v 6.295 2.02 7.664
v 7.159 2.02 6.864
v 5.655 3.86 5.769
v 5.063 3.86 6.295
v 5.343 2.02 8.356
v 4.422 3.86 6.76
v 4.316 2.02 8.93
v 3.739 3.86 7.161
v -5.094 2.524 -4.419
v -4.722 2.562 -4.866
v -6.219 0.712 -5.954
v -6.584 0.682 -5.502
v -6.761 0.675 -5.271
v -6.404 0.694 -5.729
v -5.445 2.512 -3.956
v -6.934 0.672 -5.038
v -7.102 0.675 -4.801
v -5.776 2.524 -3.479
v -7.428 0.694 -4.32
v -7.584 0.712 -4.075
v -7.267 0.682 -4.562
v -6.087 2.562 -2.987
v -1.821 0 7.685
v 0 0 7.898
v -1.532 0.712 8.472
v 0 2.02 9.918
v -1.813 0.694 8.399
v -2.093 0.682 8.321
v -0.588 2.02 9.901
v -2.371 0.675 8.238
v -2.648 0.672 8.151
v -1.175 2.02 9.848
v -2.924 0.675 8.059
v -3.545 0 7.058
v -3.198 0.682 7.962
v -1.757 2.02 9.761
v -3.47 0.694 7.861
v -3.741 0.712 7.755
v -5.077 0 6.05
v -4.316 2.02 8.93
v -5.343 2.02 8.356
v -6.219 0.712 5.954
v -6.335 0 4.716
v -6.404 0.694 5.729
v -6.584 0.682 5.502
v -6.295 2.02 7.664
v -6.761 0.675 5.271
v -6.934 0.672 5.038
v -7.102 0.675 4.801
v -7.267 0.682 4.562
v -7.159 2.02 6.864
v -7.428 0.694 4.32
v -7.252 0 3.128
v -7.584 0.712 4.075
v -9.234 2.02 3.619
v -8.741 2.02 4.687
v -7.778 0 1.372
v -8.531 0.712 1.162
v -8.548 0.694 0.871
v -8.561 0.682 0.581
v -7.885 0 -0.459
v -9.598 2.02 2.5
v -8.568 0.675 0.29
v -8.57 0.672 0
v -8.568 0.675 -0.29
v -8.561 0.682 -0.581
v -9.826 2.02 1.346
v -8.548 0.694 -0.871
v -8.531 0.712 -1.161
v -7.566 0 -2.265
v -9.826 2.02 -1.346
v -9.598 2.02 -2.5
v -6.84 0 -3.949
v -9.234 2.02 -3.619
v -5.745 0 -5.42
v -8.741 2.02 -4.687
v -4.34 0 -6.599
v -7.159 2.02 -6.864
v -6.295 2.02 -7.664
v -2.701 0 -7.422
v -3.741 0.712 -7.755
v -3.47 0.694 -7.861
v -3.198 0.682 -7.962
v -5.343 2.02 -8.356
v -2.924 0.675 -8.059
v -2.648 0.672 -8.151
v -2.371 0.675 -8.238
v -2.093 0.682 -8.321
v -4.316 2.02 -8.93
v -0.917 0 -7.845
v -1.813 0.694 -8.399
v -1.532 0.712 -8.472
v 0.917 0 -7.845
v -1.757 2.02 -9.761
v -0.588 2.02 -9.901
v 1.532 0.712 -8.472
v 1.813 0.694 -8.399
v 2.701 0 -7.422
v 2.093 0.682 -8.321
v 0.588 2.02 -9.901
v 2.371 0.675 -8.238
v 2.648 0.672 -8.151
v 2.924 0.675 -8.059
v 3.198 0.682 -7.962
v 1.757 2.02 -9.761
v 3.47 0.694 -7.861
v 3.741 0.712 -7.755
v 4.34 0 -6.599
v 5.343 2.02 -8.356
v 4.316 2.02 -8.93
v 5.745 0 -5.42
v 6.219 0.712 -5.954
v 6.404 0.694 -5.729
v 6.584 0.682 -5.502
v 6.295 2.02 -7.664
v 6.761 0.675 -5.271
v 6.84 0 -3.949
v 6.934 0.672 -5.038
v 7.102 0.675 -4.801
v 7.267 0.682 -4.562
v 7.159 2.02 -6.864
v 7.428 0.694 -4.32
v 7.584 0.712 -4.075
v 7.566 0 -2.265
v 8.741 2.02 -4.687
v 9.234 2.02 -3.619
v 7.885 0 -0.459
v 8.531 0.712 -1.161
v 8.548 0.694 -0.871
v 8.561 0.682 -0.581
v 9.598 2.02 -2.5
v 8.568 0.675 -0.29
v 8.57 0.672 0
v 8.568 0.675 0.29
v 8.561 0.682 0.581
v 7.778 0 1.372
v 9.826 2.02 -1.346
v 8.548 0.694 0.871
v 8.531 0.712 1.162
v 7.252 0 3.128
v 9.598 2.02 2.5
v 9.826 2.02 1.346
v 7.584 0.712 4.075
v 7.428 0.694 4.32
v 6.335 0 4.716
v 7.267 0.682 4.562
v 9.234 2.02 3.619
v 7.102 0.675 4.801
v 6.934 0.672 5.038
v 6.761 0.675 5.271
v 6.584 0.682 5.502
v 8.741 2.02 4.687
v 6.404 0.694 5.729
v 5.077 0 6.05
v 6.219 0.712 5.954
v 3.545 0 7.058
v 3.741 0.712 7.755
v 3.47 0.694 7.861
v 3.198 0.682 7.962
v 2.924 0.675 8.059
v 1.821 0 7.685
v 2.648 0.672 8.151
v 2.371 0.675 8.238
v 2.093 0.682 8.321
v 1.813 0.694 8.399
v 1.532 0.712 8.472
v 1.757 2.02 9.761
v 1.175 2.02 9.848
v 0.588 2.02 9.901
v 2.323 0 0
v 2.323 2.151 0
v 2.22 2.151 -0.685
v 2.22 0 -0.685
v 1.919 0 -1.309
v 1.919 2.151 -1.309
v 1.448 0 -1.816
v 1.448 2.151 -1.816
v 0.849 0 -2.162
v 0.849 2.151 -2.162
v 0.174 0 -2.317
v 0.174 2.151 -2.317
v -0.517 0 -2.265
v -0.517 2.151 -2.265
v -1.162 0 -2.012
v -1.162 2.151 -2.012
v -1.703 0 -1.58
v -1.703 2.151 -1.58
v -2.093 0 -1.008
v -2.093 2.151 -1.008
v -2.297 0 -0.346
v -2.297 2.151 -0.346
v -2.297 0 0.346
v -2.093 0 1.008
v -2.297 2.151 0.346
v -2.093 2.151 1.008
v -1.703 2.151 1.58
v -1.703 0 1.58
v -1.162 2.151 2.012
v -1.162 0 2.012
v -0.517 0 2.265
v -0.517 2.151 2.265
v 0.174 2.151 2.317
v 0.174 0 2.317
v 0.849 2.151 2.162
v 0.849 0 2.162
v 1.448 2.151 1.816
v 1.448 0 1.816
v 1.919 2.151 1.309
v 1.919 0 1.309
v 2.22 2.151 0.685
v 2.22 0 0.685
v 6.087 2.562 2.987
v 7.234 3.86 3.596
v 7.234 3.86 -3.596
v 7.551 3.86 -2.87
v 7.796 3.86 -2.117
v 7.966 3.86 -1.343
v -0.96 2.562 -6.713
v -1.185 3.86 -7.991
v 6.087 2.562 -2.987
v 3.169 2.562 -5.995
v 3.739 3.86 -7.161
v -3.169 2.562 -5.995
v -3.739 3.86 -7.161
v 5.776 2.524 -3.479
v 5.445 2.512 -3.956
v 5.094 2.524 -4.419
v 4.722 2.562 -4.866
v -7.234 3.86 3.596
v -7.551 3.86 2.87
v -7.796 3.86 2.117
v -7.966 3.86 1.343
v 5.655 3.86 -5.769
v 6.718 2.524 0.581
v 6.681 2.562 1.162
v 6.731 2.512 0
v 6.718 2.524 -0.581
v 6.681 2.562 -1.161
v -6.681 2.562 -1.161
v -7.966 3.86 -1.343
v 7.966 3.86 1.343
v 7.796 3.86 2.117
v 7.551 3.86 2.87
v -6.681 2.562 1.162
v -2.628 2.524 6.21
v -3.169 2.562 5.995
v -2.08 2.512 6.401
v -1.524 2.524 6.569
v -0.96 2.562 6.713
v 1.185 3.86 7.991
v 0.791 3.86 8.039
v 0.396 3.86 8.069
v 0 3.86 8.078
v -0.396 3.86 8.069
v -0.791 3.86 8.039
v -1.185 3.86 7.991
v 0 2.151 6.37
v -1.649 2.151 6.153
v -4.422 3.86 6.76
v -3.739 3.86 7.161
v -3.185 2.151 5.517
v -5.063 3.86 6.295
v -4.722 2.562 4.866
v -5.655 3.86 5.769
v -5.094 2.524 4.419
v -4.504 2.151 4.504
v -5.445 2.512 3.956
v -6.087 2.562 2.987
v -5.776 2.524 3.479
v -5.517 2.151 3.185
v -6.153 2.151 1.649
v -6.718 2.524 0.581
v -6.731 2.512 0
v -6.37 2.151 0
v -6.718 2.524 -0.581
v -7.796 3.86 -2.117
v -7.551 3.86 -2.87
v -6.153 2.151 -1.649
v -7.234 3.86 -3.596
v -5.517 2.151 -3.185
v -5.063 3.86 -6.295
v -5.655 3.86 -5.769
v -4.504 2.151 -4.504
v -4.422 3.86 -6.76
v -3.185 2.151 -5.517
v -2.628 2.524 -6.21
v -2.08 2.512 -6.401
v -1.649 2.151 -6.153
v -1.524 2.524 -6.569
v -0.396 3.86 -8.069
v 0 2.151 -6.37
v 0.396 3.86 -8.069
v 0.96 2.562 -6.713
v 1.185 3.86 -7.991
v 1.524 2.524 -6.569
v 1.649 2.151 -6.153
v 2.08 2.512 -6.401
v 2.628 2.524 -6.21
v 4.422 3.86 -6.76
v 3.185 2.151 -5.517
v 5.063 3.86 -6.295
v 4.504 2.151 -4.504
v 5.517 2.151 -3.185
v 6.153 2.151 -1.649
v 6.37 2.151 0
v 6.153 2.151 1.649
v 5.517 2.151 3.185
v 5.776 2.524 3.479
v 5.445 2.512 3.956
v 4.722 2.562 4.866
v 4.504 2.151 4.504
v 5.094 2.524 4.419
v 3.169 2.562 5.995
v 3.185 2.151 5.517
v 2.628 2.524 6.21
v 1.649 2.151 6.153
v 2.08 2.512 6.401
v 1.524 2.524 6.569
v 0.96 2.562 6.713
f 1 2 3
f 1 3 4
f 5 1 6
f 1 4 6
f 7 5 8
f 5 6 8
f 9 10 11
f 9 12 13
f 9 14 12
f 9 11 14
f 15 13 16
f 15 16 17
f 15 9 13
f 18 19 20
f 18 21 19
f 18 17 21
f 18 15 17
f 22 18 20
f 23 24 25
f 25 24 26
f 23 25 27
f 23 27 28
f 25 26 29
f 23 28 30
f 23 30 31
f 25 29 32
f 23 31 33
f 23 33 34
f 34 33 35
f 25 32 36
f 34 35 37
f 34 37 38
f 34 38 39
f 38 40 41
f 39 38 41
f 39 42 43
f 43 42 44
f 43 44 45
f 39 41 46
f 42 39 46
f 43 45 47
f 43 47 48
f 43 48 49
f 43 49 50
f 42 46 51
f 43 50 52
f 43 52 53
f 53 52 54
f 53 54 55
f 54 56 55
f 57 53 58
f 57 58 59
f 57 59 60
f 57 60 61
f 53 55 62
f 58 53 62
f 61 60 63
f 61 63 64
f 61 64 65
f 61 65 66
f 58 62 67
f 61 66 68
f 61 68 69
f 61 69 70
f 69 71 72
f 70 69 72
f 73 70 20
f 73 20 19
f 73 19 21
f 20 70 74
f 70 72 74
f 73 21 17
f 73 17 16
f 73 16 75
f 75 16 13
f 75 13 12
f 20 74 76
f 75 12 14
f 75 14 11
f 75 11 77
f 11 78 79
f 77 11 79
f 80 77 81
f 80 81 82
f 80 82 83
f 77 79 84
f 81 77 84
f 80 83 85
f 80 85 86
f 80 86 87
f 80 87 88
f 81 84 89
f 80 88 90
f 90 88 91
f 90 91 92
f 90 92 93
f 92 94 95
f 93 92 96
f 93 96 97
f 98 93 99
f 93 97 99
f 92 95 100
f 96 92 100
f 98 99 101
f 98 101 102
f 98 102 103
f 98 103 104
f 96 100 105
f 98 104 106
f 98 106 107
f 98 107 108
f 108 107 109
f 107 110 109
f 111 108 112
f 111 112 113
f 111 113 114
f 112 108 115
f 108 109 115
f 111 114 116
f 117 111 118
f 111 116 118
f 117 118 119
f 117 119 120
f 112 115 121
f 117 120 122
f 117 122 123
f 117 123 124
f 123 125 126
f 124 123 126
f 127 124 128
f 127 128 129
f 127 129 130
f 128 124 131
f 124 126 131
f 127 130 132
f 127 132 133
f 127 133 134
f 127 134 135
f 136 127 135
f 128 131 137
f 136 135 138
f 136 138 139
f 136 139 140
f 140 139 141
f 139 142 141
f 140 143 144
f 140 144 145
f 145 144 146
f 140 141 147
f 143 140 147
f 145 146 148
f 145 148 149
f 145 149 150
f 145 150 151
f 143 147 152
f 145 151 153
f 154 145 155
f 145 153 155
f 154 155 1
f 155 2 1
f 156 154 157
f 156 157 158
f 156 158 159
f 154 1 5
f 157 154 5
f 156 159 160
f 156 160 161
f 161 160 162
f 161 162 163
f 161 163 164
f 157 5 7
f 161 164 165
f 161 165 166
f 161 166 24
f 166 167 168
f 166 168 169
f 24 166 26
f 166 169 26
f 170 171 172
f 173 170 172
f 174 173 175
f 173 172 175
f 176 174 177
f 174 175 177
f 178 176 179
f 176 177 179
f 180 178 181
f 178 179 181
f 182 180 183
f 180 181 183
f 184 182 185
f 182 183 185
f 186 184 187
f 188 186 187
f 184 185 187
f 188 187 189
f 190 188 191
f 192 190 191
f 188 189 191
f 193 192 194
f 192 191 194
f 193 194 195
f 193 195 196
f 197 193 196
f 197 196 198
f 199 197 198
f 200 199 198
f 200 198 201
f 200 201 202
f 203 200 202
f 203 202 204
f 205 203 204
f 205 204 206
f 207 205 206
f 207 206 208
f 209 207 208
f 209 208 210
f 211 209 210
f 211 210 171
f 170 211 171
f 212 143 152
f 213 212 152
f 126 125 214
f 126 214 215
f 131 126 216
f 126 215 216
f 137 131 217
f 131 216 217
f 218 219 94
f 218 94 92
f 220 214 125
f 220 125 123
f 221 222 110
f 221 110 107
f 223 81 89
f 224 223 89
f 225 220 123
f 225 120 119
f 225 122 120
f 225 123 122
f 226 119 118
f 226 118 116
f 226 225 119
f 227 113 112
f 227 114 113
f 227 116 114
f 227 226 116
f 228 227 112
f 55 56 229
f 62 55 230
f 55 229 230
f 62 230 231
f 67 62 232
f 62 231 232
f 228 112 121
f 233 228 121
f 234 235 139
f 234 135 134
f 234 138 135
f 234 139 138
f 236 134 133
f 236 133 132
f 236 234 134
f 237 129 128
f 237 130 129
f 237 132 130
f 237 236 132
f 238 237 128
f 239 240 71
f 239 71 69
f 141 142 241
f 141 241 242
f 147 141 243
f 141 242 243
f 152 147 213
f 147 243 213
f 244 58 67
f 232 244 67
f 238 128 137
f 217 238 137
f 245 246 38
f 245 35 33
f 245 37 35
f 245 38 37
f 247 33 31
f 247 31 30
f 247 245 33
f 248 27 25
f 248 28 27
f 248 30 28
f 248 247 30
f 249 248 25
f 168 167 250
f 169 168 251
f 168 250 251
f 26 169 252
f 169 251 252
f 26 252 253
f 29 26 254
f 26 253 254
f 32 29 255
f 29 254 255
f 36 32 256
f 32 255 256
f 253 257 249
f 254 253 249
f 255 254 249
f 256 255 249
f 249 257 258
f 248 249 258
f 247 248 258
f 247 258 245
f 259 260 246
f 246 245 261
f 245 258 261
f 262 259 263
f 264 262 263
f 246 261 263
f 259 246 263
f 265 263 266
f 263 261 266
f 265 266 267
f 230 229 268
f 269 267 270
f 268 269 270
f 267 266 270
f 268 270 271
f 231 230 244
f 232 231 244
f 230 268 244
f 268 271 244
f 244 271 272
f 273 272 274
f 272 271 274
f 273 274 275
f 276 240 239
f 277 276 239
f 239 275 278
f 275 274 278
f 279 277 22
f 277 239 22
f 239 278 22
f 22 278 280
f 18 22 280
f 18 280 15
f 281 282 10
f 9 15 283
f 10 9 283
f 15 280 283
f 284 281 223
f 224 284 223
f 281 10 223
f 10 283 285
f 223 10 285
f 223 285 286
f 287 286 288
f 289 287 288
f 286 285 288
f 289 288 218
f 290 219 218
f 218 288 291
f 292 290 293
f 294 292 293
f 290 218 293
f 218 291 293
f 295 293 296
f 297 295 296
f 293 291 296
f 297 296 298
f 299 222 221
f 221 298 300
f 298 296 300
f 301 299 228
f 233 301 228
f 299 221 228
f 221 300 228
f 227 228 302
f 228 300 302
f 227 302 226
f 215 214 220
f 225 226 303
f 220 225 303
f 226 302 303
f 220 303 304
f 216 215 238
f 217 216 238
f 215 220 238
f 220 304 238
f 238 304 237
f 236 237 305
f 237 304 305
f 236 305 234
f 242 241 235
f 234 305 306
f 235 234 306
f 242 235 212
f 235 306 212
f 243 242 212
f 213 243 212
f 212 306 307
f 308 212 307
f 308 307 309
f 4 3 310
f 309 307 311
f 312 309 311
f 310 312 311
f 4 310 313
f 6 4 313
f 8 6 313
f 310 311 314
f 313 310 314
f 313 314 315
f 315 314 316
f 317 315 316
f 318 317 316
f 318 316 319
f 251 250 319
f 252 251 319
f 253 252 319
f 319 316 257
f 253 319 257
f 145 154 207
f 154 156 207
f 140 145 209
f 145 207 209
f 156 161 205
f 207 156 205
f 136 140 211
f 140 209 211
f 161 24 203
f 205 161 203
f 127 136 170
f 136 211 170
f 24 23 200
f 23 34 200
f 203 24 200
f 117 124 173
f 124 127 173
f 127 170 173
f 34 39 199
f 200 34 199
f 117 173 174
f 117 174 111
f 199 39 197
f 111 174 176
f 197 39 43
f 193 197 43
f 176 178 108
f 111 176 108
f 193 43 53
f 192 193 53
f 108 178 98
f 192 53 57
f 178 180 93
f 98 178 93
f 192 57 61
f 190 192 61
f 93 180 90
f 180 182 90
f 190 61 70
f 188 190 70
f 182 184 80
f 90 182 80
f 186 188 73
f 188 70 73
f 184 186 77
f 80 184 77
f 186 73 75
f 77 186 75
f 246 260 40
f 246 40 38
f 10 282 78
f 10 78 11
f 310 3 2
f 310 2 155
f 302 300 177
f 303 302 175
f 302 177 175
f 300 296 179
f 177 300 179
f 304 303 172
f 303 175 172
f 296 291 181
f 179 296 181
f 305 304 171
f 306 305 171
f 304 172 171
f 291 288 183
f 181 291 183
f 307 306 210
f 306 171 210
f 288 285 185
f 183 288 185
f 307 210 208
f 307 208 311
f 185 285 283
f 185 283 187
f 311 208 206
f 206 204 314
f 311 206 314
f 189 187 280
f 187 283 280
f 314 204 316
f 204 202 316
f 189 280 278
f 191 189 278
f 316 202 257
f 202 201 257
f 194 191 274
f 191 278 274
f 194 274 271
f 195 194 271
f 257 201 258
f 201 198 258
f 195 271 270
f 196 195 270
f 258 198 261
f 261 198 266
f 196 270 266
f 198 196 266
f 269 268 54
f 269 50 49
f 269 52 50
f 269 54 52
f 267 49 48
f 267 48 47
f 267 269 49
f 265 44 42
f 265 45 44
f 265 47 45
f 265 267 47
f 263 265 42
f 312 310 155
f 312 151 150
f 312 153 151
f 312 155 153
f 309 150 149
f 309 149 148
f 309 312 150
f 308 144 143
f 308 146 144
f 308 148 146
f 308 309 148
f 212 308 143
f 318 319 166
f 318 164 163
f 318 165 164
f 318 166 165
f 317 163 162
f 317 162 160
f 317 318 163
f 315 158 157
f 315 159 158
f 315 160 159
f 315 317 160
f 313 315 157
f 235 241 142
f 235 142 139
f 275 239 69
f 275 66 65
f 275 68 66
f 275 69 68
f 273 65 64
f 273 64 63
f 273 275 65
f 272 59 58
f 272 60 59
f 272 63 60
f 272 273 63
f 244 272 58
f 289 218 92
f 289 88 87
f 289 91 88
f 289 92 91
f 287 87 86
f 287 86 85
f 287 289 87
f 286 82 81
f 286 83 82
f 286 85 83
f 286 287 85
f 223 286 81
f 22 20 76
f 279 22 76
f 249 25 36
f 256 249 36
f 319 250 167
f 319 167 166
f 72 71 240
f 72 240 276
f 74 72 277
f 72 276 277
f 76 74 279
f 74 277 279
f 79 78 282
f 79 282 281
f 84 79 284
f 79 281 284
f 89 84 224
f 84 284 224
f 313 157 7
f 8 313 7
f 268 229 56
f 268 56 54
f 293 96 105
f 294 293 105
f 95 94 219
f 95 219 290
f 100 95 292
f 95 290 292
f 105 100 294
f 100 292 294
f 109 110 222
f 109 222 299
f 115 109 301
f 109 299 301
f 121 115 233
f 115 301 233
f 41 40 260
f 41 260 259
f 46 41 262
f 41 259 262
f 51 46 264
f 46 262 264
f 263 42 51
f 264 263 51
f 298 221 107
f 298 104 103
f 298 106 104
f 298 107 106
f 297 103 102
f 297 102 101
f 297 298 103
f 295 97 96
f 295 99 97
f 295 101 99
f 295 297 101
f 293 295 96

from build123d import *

# Parameters (mm, degrees)
CUT_EXTRUDE1_START = -2.681222
CUT_EXTRUDE1_DEPTH = 2.681222
CIRPATTERN3_COUNT  = 10
CUT_EXTRUDE2_REACH = 4.151
SKETCH5_R          = 2.323


with BuildPart() as part:
    # Sketch2 → Revolve2 (revolve)
    with BuildSketch(Plane(origin=(0, 0, 0), x_dir=(0, 0, -1), z_dir=(1, 0, 0))):
        Polygon((0, 0), (-7.8982, 0), (-9.91802604, 2.01982604), (-8.078303901, 3.859548179), (-6.369990486, 2.151234764), (0, 2.151234764), align=None)
    revolve(axis=Axis((0, 2.151234764, 0), (0, -1, 0)))

    # Sketch4 → Cut-Extrude1 (cut)
    with BuildSketch(Plane(origin=(-3.9491, -3.9491, 0), x_dir=(0, 0, 1), z_dir=(-0.707106781, -0.707106781, 0)).offset(CUT_EXTRUDE1_START)):
        with BuildLine():
            Line((-1.1615, 6.535539097), (1.1615, 6.535539097))
            ThreePointArc((1.1615, 6.535539097), (1.823938006, 9.981104914), (3.7168, 12.935393557))
            Line((3.7168, 12.935393557), (-3.7168, 12.935393557))
            ThreePointArc((-3.7168, 12.935393557), (-1.823938006, 9.981104914), (-1.1615, 6.535539097))
        make_face()
    cut_extrude1 = extrude(amount=CUT_EXTRUDE1_DEPTH, mode=Mode.SUBTRACT)

    # CirPattern3: Cut-Extrude1 ×10 about axis
    cirpattern3_axis = Axis((0, 0, 0), (0, 1, 0))
    for i in range(1, CIRPATTERN3_COUNT):
        add(cut_extrude1.rotate(cirpattern3_axis, i * 360 / CIRPATTERN3_COUNT), mode=Mode.SUBTRACT)

    # Sketch5 → Cut-Extrude2 (cut, up to next)
    with BuildSketch(Plane(origin=(0, 2.151234764, 0), x_dir=(1, 0, 0), z_dir=(0, 1, 0)), mode=Mode.PRIVATE) as cut_extrude2_sk1:
        Circle(SKETCH5_R)
    cut_extrude2_tool1 = extrude(cut_extrude2_sk1.sketch, amount=-CUT_EXTRUDE2_REACH, mode=Mode.PRIVATE) & part.part
    add(cut_extrude2_tool1.solids().sort_by_distance((0, 2.151235, 0))[0], mode=Mode.SUBTRACT)


solid = part.part
